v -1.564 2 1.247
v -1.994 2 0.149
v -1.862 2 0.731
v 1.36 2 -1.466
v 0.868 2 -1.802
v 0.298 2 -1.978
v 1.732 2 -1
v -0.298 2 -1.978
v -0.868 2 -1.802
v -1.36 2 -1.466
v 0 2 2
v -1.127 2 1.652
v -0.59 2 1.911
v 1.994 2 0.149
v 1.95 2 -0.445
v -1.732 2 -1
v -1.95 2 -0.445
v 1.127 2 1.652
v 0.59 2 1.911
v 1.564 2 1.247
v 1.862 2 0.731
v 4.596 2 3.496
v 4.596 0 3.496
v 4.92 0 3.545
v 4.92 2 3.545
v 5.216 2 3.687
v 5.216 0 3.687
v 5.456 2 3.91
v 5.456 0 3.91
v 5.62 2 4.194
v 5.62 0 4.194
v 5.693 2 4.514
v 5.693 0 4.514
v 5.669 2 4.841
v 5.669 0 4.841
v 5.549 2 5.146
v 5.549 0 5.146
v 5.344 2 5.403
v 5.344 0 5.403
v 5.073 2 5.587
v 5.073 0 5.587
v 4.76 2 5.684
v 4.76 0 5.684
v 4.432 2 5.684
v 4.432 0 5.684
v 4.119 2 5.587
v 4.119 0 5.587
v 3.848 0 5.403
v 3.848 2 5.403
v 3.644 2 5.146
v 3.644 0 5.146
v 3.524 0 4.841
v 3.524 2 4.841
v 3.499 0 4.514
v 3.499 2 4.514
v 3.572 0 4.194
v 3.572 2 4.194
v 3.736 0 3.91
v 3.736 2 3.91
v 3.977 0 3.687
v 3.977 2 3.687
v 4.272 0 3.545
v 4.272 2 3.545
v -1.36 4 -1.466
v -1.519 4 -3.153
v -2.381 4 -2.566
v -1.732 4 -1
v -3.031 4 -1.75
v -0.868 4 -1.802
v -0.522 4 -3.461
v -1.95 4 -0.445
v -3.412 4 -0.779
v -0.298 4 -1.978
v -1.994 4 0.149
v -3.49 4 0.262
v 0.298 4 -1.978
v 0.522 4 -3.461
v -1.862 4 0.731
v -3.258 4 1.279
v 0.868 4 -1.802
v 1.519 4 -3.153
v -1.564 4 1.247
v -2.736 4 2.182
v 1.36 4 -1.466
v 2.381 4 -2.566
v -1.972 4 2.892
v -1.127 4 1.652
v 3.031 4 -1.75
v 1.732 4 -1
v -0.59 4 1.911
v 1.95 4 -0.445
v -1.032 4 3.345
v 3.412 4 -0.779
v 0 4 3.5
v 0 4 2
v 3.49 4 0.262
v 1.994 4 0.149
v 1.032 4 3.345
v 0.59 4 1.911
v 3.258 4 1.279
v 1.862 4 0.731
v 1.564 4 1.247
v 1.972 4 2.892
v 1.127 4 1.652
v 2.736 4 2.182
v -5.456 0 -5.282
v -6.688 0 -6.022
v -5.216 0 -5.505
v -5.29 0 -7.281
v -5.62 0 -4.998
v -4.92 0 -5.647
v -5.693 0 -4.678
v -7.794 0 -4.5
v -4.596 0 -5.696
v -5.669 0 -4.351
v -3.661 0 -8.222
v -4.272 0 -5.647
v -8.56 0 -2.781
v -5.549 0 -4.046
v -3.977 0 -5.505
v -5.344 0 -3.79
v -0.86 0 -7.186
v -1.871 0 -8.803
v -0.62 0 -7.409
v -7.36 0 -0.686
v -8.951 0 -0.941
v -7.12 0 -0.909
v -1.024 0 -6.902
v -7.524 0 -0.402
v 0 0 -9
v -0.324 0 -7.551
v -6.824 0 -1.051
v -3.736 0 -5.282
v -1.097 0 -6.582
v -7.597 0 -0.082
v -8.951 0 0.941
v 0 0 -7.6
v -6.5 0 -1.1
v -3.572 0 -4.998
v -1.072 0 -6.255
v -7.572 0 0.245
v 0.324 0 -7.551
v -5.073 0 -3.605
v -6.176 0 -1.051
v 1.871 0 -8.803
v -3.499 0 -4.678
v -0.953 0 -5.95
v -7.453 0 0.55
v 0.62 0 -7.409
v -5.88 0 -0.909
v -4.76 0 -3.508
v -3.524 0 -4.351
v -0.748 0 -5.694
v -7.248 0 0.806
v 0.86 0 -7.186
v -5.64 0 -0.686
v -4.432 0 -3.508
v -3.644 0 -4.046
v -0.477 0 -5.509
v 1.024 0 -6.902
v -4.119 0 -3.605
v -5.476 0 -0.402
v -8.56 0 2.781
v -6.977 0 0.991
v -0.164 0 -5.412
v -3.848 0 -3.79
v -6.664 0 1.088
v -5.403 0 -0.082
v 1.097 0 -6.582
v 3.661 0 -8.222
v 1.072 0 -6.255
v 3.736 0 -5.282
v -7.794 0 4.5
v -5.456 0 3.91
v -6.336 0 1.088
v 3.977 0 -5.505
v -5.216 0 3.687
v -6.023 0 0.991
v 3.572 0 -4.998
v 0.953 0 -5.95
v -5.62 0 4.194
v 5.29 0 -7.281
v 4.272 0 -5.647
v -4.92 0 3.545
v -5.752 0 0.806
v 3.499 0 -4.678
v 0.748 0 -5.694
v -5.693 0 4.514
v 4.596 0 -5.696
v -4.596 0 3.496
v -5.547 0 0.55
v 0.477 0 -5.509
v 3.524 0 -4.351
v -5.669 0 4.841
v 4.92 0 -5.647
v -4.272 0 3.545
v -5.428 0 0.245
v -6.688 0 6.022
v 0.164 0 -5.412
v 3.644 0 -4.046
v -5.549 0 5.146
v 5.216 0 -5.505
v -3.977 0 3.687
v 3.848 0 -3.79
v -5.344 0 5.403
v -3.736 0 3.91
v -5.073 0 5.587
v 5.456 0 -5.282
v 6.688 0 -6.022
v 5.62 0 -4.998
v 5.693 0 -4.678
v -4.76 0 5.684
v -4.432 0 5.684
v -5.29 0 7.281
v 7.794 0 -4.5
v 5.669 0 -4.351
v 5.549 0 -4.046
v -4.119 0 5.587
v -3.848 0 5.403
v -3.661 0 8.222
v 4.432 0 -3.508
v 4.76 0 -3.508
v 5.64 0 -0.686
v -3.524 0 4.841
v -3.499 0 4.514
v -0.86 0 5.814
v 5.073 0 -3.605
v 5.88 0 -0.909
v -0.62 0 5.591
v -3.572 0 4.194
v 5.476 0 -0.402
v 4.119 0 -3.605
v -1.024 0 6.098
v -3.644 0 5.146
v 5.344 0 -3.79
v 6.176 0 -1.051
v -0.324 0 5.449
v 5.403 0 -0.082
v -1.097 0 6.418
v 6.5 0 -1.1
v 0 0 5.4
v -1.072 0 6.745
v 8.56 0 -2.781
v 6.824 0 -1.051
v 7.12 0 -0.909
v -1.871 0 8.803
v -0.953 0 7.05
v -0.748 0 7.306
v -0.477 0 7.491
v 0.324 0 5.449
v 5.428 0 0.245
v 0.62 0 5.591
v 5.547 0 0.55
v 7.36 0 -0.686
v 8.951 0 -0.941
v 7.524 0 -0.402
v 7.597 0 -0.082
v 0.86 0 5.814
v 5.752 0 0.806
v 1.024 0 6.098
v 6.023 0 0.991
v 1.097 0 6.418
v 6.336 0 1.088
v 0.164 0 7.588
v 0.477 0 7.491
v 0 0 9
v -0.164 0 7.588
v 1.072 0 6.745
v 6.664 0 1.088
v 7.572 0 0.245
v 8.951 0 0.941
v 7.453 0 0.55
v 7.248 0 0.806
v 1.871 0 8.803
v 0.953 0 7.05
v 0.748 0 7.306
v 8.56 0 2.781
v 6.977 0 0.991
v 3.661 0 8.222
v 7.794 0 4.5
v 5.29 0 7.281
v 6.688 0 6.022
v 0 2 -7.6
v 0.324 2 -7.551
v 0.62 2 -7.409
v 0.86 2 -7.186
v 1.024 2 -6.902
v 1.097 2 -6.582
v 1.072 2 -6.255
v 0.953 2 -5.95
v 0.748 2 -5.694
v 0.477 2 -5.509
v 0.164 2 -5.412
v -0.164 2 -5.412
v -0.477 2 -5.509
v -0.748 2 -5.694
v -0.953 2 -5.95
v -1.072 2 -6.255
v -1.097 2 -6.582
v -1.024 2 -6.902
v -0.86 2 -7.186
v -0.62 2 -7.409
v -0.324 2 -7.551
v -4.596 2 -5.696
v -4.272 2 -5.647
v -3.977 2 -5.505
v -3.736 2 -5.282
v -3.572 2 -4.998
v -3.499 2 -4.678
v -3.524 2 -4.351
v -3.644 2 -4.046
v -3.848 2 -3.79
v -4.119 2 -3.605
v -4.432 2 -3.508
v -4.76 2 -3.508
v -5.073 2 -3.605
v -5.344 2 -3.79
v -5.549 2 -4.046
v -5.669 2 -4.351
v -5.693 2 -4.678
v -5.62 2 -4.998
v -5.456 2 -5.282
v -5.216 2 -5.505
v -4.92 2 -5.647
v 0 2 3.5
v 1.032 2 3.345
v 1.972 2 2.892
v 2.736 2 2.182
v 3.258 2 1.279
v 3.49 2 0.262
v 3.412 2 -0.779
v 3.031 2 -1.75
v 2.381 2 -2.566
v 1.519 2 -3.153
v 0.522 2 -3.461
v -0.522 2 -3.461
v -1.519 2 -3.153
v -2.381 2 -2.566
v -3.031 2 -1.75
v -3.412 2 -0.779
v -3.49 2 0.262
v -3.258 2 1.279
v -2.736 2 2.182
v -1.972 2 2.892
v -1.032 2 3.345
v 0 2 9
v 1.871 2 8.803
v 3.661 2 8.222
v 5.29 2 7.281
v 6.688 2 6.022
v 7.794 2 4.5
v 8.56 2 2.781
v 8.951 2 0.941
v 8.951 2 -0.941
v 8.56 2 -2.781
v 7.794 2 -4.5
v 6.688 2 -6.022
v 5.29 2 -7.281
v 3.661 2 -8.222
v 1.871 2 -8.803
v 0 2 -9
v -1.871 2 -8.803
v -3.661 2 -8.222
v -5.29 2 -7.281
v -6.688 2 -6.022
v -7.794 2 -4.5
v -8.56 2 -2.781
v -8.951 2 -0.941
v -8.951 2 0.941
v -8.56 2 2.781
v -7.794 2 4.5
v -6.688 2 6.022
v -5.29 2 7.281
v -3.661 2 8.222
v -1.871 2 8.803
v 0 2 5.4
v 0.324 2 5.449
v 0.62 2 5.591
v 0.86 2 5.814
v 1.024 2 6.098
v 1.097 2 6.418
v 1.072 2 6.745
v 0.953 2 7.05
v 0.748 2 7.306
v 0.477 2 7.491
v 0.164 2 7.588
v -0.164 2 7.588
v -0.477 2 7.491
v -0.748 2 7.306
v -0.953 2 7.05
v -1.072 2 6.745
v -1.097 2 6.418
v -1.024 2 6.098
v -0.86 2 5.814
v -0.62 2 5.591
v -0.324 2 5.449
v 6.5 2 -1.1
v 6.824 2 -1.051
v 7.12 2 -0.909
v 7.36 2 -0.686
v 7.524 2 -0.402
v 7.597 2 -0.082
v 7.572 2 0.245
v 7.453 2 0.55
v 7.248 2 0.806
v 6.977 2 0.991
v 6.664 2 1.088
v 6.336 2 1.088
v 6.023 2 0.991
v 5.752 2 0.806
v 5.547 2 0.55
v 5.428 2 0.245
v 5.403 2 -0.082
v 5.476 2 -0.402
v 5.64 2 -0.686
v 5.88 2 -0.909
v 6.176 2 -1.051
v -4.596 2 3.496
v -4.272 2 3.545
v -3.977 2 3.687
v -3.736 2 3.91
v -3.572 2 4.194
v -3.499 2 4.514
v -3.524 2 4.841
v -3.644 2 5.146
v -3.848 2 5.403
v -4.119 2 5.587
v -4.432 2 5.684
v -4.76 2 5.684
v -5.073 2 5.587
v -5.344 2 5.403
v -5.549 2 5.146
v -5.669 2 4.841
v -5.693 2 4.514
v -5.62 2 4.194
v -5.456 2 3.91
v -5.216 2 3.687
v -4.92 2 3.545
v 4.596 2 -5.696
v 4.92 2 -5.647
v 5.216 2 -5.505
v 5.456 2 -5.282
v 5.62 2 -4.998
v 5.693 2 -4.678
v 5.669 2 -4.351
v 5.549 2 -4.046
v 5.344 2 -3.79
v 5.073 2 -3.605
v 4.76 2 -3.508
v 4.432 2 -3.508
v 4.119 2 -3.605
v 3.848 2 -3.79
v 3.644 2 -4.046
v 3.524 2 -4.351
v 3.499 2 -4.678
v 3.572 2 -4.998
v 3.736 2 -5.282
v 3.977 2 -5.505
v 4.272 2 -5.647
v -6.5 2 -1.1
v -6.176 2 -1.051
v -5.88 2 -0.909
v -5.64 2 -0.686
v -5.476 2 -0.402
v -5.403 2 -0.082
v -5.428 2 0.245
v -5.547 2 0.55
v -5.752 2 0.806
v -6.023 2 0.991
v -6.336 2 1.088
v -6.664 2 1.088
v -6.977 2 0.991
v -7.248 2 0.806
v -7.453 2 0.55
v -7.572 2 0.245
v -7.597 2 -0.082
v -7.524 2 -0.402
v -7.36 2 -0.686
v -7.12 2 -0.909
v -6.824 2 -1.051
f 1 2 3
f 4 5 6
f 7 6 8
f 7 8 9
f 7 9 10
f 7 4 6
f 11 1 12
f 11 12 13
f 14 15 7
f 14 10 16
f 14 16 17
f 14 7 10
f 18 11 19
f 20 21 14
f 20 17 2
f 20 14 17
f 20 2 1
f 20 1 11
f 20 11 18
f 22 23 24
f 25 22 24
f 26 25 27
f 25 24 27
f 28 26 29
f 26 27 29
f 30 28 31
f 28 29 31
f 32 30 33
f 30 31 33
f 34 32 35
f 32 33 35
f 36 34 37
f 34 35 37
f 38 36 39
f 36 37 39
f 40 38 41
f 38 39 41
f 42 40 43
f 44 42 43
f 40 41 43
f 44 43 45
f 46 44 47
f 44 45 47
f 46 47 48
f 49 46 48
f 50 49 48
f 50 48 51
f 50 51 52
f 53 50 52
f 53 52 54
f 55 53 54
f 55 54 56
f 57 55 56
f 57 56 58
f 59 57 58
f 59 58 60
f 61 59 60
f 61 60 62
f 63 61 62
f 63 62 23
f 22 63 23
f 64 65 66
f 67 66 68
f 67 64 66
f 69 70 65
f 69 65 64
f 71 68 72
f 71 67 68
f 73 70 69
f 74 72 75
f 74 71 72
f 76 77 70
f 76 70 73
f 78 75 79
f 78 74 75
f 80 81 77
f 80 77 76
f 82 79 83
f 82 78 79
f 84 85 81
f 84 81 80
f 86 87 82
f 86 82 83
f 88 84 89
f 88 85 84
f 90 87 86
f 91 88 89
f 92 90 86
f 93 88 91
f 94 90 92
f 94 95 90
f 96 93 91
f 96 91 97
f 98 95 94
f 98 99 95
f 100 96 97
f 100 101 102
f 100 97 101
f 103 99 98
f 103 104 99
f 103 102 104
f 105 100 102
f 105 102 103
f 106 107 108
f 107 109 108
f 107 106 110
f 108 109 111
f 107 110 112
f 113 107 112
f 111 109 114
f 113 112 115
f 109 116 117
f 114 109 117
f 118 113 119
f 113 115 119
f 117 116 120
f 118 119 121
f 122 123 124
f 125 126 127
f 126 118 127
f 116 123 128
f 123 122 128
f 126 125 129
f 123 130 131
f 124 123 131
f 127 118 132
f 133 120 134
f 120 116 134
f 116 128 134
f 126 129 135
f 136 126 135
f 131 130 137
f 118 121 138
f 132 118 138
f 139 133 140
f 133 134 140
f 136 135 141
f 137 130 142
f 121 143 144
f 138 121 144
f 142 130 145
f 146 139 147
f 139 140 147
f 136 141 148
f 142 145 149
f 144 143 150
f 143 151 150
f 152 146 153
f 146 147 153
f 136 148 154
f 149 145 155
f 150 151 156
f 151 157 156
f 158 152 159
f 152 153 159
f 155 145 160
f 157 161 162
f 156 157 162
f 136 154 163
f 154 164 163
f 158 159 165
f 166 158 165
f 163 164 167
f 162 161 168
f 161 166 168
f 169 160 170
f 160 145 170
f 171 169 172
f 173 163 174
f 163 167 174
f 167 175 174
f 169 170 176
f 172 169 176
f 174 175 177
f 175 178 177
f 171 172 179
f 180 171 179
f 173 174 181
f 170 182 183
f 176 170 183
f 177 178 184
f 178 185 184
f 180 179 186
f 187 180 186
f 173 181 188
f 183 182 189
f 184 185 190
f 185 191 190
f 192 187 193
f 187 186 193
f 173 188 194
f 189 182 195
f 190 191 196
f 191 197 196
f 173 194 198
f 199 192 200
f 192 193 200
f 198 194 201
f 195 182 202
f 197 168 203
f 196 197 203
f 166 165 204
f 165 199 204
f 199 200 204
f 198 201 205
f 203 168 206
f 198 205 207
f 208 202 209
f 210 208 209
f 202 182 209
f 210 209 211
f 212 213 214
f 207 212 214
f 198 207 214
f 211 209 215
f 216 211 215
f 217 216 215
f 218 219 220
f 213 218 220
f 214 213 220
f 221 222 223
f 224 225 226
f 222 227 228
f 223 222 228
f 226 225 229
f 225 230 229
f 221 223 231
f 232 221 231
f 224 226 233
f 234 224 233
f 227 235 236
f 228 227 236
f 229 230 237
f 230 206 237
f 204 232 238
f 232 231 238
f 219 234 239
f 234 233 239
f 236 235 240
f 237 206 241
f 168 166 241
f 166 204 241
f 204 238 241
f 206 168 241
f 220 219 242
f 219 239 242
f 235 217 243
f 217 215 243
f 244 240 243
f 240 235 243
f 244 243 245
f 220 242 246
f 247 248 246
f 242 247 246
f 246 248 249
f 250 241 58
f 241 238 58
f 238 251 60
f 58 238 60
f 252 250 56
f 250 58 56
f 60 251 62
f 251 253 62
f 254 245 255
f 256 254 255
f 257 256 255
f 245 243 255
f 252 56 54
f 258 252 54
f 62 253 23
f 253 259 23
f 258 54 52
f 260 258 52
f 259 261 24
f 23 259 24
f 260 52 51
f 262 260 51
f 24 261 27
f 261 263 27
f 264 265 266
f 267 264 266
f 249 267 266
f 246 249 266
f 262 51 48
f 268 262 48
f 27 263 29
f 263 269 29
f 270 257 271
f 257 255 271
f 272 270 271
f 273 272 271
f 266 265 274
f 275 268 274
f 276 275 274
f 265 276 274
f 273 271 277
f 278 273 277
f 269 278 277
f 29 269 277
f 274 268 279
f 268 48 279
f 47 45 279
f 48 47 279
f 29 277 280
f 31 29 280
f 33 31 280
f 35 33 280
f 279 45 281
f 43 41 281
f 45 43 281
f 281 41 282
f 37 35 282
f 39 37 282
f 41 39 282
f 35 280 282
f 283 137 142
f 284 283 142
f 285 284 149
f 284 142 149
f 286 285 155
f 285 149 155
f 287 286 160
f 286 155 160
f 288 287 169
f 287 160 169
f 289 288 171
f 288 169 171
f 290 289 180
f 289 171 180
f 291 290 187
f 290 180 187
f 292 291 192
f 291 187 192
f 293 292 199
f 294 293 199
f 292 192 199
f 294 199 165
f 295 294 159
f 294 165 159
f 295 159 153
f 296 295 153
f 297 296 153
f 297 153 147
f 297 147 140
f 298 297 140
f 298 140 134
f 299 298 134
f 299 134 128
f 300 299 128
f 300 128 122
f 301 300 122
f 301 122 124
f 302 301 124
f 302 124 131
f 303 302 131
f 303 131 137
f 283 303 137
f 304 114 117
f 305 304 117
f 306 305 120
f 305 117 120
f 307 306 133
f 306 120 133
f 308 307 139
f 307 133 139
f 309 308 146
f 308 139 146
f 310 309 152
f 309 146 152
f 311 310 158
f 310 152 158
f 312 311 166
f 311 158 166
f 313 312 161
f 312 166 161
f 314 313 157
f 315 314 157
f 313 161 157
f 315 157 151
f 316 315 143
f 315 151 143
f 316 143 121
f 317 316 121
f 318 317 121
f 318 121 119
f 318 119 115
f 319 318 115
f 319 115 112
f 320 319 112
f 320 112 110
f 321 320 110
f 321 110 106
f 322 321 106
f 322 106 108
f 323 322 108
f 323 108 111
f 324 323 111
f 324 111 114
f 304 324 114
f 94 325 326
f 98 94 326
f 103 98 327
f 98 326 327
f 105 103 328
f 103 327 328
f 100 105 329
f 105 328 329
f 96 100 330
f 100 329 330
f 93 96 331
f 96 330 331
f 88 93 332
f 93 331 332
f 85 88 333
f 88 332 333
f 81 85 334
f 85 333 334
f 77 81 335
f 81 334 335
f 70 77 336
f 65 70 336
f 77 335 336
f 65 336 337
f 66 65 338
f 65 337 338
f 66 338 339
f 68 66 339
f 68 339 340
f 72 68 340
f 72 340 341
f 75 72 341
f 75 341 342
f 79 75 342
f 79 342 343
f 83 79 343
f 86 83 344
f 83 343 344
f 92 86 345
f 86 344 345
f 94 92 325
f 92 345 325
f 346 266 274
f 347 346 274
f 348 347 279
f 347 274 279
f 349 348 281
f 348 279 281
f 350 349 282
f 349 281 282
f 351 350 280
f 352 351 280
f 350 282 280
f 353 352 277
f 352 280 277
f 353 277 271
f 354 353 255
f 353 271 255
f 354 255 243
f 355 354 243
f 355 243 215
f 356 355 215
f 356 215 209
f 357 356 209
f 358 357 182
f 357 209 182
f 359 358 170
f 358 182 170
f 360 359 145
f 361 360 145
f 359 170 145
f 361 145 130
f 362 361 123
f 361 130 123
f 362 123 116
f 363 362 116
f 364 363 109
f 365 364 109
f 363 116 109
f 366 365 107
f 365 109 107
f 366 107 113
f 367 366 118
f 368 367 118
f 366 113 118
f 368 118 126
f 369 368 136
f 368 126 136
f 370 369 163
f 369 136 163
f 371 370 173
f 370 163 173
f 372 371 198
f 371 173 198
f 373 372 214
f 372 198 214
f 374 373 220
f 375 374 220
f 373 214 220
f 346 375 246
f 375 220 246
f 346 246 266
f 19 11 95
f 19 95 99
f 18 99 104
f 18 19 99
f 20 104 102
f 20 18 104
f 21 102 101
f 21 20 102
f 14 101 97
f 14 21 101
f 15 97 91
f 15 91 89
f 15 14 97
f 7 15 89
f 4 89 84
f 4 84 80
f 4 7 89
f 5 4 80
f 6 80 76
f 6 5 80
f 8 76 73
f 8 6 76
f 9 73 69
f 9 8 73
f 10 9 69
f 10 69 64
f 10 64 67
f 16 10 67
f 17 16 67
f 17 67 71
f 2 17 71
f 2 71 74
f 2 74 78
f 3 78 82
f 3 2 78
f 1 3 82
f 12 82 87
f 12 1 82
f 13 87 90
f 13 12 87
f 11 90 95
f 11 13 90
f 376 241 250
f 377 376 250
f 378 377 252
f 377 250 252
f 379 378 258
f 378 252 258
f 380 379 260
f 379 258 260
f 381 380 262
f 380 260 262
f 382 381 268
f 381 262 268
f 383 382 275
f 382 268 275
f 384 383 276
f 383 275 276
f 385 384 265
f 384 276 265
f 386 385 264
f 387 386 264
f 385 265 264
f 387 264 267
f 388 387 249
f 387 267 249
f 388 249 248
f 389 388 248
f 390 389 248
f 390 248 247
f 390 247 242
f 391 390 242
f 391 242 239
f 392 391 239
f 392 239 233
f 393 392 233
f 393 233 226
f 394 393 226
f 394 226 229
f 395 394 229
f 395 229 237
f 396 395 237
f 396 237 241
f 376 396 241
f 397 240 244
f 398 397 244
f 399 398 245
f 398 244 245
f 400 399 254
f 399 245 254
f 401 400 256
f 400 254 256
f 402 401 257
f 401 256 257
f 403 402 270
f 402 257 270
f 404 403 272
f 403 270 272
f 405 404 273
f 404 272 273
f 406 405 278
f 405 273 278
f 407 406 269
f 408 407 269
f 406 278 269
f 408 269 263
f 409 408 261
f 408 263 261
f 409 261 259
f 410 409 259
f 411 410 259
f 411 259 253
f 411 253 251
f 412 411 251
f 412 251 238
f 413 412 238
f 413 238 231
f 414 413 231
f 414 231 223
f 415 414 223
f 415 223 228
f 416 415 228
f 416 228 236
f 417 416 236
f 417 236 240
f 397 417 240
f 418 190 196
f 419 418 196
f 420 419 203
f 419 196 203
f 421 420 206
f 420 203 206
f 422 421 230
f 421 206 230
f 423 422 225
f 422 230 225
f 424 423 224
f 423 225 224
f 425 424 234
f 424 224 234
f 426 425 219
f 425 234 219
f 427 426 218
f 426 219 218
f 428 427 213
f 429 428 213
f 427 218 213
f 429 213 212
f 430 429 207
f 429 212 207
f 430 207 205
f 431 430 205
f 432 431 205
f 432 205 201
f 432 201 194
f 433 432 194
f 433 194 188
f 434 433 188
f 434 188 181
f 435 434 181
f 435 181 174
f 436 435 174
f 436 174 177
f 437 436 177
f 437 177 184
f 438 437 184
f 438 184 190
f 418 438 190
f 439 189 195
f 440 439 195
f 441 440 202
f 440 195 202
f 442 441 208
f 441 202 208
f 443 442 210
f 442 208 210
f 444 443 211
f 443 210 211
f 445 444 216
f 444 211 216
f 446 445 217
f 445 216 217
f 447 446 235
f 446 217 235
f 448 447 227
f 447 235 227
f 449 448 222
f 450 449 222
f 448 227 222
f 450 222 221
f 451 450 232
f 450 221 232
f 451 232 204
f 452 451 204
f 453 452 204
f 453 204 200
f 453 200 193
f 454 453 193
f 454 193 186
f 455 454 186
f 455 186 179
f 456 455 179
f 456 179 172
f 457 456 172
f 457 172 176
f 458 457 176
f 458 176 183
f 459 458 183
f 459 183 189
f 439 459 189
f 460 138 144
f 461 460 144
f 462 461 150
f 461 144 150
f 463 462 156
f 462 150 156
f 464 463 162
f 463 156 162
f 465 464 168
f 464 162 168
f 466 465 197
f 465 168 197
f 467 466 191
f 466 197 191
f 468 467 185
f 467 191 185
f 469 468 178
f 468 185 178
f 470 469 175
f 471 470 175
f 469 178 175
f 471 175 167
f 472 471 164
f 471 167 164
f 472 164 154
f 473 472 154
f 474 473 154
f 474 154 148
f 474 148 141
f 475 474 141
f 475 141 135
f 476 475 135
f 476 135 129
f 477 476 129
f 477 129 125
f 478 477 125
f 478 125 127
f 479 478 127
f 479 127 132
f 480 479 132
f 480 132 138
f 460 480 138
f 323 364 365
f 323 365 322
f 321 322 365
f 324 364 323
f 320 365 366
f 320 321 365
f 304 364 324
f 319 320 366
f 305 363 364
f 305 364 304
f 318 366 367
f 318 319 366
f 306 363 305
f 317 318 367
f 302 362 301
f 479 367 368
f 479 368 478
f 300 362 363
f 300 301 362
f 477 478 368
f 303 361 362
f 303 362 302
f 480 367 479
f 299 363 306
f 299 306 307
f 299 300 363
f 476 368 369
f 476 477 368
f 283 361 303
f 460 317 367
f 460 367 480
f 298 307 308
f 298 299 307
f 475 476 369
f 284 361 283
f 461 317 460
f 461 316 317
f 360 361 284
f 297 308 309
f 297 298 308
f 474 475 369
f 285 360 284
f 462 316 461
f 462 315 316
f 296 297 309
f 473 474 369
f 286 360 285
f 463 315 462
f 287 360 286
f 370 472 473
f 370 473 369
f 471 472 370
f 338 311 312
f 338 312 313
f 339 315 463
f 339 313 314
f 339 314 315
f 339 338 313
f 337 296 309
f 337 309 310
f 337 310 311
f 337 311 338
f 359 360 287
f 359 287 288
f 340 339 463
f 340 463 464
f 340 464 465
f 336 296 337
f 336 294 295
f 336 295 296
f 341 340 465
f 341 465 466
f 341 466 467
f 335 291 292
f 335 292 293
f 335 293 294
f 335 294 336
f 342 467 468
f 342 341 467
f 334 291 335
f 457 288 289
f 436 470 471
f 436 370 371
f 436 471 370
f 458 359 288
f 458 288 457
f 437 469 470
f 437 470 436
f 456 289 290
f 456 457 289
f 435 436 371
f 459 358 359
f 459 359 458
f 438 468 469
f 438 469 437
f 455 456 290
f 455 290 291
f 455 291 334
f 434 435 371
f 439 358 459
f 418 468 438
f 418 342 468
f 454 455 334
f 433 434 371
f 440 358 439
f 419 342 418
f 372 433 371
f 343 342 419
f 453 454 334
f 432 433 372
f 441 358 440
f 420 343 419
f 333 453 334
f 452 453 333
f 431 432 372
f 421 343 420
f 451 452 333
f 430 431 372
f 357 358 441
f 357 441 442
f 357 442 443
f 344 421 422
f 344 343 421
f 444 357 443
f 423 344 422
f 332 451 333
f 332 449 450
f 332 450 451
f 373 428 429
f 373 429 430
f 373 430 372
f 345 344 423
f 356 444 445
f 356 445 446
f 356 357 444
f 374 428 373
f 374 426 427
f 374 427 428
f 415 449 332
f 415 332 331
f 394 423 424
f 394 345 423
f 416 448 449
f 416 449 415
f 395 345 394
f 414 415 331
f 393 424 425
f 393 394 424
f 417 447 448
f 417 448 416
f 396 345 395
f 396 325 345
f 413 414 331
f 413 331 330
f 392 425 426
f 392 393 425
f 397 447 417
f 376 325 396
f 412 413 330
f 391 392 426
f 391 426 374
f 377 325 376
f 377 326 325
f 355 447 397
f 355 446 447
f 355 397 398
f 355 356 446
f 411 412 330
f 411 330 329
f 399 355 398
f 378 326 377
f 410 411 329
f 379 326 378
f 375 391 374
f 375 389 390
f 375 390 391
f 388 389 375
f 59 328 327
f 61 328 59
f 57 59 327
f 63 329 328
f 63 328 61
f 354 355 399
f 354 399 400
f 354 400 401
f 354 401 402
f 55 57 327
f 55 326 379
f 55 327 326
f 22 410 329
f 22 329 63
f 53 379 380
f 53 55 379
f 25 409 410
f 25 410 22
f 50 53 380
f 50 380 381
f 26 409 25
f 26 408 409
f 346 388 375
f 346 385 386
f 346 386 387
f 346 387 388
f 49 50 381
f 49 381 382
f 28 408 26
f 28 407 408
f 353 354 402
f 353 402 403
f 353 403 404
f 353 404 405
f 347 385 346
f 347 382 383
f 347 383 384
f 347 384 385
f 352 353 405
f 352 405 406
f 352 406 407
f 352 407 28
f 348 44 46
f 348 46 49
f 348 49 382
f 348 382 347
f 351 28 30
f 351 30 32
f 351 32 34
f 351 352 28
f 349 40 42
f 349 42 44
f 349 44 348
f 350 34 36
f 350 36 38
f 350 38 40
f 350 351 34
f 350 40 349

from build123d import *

# Parameters (mm, degrees)
SKETCH_1_R          = 9
EXTRUDE_1_DEPTH     = 2
SKETCH_2_R          = 3.5
SKETCH_2_R_2        = 2
EXTRUDE_2_DEPTH     = 2
SKETCH_3_R          = 1.1
CUT_EXTRUDE_1_DEPTH = 14.341664064


with BuildPart() as part:
    # 草图1 → 凸台-拉伸1 (new body)
    with BuildSketch(Plane(origin=(0, 0, 0), x_dir=(1, 0, 0), z_dir=(0, 1, 0))):
        with Locations(Location((0, 0, 0), (0, 0, 270))):
            Circle(SKETCH_1_R)
    extrude(amount=EXTRUDE_1_DEPTH)

    # 草图2 → 凸台-拉伸2 (add)
    with BuildSketch(Plane(origin=(0, 2, 0), x_dir=(1, 0, 0), z_dir=(0, 1, 0))):
        with Locations(Location((0, 0, 0), (0, 0, 270))):
            Circle(SKETCH_2_R)
        with Locations(Location((0, 0, 0), (0, 0, 270))):
            Circle(SKETCH_2_R_2, mode=Mode.SUBTRACT)
    extrude(amount=EXTRUDE_2_DEPTH)

    # 草图3 → 切除-拉伸1 (cut, through all)
    with BuildSketch(Plane.XZ):
        with Locations(Location((0, 6.5, 0), (0, 0, 270))):
            Circle(SKETCH_3_R)
        with Locations(Location((4.596194078, 4.596194078, 0), (0, 0, 270))):
            Circle(SKETCH_3_R)
        with Locations(Location((6.5, 0, 0), (0, 0, 270))):
            Circle(SKETCH_3_R)
        with Locations(Location((4.596194078, -4.596194078, 0), (0, 0, 270))):
            Circle(SKETCH_3_R)
        with Locations(Location((0, -6.5, 0), (0, 0, 270))):
            Circle(SKETCH_3_R)
        with Locations(Location((-4.596194078, -4.596194078, 0), (0, 0, 270))):
            Circle(SKETCH_3_R)
        with Locations(Location((-6.5, 0, 0), (0, 0, 270))):
            Circle(SKETCH_3_R)
        with Locations(Location((-4.596194078, 4.596194078, 0), (0, 0, 270))):
            Circle(SKETCH_3_R)
    extrude(amount=-CUT_EXTRUDE_1_DEPTH, mode=Mode.SUBTRACT)


solid = part.part
